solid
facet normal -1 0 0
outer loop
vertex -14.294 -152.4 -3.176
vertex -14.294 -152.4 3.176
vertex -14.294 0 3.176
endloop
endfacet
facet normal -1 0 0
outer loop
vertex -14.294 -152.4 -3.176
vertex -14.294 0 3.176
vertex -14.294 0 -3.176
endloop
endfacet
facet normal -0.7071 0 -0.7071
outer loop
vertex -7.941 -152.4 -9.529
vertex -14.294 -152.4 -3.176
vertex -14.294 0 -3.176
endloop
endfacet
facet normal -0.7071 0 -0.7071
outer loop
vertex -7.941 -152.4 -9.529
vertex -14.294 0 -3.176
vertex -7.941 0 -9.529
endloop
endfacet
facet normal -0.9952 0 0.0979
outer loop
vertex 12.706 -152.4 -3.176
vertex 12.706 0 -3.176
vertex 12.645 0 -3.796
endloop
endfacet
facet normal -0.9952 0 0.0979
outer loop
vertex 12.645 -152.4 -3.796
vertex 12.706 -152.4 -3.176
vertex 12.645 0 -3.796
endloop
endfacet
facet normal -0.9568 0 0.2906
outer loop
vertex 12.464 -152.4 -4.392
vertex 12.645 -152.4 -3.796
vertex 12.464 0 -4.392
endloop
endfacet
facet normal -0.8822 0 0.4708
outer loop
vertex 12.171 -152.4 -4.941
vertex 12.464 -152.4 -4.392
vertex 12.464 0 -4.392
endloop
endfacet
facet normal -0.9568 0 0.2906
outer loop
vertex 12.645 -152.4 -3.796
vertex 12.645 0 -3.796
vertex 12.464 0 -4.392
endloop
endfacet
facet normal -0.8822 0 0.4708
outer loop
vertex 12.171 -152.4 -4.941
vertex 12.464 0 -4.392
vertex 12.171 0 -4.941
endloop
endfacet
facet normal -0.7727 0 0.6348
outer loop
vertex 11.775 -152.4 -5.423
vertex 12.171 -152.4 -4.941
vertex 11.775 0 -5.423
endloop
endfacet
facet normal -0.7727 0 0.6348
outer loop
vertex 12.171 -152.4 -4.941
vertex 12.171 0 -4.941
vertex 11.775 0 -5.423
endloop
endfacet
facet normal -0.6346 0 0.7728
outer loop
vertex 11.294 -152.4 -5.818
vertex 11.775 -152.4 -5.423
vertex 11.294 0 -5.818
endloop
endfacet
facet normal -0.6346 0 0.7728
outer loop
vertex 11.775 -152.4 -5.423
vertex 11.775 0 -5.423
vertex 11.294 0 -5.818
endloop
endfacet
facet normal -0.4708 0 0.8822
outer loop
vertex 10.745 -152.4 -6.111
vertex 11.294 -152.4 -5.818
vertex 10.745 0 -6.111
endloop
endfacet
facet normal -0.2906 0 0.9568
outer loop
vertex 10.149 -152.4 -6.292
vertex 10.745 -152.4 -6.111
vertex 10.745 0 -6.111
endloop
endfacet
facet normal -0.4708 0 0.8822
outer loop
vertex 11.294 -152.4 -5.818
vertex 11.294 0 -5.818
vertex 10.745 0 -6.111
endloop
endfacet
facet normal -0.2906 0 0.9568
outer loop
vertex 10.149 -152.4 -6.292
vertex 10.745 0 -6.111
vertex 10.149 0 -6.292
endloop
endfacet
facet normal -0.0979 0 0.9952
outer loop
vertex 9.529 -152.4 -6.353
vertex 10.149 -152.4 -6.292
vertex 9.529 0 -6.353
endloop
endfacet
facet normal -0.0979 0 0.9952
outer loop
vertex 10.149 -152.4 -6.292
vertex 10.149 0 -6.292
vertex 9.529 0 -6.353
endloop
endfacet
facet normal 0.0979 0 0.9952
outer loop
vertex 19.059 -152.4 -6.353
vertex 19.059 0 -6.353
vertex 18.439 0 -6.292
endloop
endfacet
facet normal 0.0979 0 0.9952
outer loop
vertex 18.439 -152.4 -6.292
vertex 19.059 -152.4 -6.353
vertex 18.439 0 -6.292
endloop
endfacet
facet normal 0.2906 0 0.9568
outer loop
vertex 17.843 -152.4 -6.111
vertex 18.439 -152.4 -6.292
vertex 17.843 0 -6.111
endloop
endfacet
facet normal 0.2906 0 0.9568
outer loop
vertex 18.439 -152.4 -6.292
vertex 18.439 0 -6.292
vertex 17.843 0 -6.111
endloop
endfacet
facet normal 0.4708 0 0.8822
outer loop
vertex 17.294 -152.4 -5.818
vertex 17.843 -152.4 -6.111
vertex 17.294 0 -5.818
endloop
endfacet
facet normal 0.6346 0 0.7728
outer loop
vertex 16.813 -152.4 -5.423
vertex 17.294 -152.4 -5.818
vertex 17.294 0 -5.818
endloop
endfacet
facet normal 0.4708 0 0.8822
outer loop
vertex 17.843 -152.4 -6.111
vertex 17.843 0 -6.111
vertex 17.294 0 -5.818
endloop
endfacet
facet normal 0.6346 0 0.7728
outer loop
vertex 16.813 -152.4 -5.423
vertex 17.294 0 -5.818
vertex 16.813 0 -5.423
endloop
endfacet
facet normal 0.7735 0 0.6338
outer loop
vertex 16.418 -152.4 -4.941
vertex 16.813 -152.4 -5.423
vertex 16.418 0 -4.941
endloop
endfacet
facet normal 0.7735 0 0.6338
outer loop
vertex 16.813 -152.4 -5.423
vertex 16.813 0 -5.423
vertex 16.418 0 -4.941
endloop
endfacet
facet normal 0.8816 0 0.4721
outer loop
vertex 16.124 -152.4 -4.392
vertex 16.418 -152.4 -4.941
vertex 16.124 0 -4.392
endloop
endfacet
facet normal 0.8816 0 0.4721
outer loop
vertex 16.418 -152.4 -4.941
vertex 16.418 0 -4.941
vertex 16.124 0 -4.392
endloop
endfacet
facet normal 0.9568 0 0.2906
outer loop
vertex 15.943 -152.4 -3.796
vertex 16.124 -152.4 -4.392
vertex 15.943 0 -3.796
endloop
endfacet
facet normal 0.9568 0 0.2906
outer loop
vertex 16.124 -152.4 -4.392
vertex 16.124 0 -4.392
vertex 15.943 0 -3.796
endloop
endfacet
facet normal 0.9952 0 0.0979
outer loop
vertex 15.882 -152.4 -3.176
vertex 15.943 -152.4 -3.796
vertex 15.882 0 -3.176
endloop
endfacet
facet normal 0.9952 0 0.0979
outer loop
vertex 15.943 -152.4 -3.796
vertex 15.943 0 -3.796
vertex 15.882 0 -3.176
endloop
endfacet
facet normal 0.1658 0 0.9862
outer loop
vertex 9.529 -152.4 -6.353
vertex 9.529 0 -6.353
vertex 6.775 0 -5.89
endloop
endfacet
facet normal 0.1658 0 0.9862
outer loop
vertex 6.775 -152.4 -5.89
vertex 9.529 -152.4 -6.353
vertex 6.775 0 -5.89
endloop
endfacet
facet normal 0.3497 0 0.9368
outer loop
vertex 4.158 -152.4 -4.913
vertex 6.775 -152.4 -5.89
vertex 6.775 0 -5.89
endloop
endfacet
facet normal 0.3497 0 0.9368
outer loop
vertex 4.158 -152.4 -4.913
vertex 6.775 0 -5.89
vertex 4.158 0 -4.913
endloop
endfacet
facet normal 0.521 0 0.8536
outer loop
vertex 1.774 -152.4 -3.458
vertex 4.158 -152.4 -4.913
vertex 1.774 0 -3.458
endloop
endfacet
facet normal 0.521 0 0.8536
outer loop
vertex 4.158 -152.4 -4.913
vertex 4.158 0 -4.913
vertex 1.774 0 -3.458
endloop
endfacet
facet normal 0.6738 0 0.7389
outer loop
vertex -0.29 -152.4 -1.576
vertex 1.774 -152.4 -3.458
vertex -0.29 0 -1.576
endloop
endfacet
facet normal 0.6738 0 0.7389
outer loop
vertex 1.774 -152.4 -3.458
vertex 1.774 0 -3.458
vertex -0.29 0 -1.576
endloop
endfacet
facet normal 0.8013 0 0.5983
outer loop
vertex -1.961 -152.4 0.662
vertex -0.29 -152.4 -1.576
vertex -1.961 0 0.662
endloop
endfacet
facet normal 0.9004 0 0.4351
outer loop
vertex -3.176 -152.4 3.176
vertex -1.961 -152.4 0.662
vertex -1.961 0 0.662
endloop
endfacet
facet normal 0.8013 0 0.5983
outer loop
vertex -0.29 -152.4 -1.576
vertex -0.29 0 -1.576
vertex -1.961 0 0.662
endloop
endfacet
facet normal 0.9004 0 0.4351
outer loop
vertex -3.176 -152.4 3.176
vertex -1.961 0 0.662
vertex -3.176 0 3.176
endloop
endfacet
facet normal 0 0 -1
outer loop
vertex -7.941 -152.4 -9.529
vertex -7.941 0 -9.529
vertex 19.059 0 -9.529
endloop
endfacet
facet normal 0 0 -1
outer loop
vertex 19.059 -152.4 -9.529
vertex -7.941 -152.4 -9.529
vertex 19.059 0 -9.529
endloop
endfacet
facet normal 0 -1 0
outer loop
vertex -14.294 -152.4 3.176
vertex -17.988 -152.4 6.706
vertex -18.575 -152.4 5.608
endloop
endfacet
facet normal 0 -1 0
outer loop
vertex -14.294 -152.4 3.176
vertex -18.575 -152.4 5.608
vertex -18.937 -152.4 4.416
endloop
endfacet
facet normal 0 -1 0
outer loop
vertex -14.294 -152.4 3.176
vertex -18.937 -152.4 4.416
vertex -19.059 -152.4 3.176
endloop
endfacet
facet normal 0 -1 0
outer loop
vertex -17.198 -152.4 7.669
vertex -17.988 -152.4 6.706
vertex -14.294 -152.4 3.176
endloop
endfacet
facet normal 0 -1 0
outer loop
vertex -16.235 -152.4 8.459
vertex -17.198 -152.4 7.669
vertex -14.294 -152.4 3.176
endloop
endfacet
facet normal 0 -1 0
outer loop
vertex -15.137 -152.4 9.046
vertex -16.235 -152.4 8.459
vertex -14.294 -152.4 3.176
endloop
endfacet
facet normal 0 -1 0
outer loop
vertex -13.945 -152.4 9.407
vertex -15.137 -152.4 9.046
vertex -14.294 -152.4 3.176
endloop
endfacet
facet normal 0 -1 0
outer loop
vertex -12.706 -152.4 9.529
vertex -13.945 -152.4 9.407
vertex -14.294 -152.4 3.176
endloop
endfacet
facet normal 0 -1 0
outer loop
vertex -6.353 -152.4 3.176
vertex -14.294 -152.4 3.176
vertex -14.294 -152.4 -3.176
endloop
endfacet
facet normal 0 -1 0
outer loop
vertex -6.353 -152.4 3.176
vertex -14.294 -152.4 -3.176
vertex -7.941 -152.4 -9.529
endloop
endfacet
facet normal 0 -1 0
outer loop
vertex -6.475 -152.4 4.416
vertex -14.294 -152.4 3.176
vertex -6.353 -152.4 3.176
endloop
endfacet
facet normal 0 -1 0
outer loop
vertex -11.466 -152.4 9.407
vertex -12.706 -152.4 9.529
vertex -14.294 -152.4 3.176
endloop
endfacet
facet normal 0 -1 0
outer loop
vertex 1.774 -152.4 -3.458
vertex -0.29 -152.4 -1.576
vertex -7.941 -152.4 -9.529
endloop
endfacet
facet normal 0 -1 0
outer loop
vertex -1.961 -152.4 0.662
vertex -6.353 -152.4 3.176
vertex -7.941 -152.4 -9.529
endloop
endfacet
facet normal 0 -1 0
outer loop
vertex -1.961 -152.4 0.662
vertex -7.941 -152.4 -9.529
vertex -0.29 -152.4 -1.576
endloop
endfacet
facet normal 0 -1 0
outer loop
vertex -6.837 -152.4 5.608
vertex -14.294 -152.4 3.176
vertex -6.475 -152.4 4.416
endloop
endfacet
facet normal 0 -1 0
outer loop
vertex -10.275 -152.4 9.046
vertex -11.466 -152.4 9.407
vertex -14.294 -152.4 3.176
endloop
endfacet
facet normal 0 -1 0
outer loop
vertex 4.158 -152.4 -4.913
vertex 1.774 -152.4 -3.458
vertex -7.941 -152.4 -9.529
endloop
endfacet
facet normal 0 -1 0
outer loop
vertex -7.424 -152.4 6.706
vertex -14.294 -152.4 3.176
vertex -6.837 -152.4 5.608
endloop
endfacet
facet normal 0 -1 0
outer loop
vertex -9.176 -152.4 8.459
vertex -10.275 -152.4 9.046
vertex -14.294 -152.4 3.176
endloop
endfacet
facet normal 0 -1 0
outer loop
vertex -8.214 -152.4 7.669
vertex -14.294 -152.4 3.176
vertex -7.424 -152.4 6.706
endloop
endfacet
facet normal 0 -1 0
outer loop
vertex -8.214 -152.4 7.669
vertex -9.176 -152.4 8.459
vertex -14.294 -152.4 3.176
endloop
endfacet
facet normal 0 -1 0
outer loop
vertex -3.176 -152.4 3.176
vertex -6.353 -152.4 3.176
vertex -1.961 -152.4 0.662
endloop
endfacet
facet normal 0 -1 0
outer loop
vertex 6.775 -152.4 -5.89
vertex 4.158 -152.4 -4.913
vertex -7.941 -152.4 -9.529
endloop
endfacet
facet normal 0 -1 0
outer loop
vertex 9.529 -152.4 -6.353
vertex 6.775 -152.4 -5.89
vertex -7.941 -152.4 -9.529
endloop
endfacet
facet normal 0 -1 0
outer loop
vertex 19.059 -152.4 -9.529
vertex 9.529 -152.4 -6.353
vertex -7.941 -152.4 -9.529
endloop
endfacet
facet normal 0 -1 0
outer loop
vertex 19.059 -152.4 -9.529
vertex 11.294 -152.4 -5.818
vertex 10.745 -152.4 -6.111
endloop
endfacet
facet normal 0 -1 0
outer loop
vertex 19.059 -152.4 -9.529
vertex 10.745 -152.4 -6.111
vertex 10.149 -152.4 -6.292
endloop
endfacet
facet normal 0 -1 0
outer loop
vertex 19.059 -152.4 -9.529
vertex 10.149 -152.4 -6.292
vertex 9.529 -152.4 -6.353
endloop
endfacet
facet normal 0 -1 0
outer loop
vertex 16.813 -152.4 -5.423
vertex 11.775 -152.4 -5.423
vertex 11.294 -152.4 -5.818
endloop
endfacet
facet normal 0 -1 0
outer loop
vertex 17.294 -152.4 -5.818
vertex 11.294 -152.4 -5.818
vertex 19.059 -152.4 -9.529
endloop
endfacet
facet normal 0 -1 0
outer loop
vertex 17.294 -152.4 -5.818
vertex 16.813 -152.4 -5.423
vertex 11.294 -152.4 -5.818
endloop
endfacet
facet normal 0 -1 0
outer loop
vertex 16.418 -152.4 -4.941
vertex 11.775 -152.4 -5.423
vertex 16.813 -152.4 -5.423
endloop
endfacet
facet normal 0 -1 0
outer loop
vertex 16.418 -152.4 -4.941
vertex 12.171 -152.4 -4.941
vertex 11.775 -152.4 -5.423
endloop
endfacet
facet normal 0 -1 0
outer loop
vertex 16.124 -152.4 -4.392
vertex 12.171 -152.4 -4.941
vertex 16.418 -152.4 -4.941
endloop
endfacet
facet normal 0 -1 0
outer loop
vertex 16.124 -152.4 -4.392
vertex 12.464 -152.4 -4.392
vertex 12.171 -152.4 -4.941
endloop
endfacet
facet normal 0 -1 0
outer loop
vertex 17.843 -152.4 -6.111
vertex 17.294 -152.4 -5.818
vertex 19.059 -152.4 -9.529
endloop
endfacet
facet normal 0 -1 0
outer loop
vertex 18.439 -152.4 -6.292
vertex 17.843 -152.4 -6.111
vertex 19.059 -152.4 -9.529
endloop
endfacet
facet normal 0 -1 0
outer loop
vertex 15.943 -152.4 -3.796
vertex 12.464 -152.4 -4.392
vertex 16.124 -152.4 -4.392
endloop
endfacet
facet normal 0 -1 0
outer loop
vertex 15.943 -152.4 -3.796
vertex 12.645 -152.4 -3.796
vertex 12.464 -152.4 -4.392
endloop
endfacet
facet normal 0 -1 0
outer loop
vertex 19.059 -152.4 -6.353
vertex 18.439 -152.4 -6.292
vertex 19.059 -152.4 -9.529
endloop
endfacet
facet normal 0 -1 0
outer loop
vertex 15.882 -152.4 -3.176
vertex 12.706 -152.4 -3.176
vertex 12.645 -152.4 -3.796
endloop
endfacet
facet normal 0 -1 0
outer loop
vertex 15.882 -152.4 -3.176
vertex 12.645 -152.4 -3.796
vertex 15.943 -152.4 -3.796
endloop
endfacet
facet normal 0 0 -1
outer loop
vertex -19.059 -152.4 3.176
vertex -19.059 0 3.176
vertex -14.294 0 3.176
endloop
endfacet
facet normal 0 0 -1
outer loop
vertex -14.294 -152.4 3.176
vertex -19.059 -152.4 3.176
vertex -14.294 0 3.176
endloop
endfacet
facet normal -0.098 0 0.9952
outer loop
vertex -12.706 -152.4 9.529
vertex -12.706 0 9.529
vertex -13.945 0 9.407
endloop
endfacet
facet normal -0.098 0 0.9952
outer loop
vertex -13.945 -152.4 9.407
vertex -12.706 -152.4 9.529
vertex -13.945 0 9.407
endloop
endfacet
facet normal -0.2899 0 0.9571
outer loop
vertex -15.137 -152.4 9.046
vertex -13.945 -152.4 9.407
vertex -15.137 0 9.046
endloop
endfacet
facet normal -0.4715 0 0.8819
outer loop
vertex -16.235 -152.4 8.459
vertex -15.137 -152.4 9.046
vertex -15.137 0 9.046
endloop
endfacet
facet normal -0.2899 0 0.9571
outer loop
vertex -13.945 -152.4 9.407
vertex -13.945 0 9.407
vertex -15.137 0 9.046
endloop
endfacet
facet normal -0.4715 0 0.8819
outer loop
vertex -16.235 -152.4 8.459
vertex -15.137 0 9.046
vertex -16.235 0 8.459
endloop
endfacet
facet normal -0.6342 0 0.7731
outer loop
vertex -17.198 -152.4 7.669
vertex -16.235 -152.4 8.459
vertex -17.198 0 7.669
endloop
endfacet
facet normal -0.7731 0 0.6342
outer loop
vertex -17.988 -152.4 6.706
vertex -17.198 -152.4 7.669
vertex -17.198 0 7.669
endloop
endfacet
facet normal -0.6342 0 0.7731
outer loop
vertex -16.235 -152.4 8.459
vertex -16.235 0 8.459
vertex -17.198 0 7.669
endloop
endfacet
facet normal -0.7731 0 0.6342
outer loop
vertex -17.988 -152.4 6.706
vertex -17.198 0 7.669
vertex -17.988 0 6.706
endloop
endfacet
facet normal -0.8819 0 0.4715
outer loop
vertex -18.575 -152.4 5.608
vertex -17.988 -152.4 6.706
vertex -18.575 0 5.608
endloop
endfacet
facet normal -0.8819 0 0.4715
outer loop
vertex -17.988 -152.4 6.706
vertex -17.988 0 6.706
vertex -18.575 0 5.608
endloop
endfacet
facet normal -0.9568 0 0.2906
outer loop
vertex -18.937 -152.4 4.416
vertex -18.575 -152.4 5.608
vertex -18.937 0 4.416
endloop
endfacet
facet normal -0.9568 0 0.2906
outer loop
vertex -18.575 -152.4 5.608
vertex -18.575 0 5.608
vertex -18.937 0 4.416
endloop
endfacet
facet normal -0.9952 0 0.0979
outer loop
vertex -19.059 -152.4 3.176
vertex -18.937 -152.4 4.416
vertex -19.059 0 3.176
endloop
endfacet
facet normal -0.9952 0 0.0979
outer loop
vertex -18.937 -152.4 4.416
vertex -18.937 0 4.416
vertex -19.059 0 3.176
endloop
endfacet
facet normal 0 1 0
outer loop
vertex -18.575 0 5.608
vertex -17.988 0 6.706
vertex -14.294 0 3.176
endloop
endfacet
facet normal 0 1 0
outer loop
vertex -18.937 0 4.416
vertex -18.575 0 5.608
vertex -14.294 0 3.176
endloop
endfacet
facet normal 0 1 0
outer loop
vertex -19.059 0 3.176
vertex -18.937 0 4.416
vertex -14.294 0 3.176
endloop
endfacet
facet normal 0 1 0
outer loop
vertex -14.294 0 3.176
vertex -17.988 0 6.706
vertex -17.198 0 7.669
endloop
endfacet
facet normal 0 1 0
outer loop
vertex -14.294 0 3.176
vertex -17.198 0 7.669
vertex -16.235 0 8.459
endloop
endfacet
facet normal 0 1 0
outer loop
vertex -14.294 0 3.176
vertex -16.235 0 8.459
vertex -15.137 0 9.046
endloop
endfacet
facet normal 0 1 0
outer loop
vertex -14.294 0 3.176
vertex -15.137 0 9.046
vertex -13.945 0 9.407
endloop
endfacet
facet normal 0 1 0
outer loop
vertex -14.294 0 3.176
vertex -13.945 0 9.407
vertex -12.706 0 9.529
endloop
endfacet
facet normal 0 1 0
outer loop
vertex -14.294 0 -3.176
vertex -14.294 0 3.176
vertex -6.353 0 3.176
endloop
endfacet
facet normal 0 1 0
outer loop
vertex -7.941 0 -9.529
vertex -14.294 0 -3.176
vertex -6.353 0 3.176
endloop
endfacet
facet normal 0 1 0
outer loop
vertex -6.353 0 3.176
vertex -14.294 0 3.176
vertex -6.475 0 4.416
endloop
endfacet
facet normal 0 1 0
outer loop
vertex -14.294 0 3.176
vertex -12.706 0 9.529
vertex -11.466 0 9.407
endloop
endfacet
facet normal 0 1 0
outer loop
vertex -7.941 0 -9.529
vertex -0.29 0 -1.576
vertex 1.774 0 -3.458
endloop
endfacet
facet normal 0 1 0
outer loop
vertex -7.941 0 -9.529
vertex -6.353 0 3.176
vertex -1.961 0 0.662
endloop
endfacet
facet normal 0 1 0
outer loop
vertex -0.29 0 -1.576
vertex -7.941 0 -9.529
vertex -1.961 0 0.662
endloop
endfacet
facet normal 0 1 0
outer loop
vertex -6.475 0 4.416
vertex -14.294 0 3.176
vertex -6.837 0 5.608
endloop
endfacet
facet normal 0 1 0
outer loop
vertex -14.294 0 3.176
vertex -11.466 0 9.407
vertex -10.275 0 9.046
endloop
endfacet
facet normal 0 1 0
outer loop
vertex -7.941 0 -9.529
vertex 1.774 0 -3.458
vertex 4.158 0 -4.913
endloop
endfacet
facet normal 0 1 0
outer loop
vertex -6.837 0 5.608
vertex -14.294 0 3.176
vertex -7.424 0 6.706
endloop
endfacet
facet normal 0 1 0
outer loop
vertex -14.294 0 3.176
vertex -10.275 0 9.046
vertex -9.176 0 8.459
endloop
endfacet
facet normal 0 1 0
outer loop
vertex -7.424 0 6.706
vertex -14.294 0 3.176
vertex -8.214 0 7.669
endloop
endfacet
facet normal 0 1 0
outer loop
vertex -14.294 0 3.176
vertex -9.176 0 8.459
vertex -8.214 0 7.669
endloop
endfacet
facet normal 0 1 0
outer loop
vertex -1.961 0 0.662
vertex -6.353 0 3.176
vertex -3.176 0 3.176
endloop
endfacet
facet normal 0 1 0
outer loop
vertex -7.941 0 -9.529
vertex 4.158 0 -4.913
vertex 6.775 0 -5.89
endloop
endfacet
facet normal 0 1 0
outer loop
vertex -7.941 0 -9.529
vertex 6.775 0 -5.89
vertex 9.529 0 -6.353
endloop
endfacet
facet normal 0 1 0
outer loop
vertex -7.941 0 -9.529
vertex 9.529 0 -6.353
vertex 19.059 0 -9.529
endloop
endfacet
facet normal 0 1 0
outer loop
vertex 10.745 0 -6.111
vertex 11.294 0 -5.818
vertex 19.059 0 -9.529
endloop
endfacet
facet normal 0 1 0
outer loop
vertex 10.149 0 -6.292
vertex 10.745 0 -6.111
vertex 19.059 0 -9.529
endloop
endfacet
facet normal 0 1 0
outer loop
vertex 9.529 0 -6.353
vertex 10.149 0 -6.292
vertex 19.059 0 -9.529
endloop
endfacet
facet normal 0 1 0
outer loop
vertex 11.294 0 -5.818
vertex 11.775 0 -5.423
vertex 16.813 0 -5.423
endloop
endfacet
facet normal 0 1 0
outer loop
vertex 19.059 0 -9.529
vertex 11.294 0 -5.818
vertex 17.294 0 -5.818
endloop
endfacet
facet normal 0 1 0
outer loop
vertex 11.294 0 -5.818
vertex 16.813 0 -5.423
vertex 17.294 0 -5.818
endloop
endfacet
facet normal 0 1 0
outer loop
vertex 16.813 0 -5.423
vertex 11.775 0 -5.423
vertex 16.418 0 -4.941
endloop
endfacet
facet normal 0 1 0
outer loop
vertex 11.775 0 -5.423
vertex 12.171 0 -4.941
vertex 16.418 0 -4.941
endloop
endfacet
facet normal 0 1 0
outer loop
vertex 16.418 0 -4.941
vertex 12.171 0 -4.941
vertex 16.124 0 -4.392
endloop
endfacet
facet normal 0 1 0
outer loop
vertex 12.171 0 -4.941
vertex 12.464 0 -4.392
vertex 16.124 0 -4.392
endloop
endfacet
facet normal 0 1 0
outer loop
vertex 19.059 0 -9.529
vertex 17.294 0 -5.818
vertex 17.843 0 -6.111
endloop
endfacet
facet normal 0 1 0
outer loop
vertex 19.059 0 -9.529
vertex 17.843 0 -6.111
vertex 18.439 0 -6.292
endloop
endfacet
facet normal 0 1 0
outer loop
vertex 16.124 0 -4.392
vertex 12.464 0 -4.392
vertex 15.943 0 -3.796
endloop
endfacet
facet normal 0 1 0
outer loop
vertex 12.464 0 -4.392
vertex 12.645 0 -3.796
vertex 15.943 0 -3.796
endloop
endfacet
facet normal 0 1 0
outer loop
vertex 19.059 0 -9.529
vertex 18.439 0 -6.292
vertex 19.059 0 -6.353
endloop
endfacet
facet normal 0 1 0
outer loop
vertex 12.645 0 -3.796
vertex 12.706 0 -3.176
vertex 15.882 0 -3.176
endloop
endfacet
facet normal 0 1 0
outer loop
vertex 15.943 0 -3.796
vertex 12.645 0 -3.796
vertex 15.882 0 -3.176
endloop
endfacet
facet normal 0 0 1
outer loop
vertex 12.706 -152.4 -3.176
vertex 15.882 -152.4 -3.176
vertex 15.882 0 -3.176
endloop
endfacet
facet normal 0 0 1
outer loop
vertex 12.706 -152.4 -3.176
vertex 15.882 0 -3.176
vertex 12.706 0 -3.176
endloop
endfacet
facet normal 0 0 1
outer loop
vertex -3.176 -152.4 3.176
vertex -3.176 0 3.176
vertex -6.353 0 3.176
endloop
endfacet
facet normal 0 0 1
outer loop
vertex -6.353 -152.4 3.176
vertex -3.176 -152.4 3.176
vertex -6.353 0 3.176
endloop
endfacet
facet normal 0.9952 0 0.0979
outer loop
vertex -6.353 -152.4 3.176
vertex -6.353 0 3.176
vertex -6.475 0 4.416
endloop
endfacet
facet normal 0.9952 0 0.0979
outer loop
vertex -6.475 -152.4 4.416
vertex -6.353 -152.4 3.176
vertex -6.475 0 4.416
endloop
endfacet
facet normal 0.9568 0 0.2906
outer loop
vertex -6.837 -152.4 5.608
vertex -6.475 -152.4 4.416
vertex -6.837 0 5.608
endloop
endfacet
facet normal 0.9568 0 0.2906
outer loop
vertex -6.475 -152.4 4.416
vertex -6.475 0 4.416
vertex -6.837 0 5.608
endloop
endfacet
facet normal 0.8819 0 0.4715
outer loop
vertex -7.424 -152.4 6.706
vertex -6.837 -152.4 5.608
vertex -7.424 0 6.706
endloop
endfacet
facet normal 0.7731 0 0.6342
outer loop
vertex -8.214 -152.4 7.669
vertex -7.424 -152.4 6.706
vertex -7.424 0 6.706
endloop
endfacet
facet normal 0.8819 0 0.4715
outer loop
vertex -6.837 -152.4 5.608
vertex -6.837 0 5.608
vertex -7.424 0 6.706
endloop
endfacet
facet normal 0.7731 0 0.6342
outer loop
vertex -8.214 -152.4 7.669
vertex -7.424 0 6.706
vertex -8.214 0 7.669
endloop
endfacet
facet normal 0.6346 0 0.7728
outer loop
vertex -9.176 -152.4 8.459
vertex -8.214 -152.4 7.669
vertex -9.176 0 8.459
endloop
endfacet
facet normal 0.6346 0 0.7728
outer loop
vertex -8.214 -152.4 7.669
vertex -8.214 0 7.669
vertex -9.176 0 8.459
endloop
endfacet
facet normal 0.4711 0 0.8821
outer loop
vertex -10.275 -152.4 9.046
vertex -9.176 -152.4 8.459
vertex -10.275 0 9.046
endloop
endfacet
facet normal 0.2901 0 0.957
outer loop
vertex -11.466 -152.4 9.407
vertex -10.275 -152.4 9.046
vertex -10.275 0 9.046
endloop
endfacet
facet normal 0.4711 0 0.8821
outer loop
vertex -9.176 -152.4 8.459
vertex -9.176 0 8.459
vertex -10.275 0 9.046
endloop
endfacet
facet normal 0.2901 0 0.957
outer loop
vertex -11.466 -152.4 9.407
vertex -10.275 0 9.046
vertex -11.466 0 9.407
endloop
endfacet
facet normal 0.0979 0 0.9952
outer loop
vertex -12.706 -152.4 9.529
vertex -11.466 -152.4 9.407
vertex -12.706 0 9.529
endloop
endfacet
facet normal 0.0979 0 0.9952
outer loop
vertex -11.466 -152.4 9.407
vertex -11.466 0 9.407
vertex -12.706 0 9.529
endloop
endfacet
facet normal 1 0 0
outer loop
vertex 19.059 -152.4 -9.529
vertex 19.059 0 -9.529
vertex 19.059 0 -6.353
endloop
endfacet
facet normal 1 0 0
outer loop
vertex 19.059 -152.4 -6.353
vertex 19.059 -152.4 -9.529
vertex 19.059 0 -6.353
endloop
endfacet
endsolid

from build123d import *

# Parameters (mm, degrees)
F1_DEPTH = 152.4


# Not quite as in the source:
# - ends of sketch curves that miss each other by under 0.0002 mm in the source are joined


with BuildPart() as f1:
    # F0 (on Front) → F1 (new body)
    with BuildSketch(Plane.XZ):
        with BuildLine():
            ThreePointArc((-6.352921, 3.1764732), (-8.2136484806, 7.6686667194), (-12.705842, 9.5293942))
            ThreePointArc((-12.705842, 9.5293942), (-17.1980355194, 7.6686667194), (-19.058763, 3.1764732))
            Line((-19.058763, 3.1764732), (-14.2940786, 3.1764732))
            Line((-14.2940786, 3.1764732), (-14.2940786, -3.1764478))
            Line((-14.2940786, -3.1764478), (-7.9411576, -9.5293942))
            Line((-7.9411576, -9.5293942), (19.058763, -9.5293942))
            Line((19.058763, -9.5293942), (19.058763, -6.352921))
            ThreePointArc((19.058763, -6.352921), (16.81265726, -5.42255354), (15.8822898, -3.1764478))
            Line((15.8822898, -3.1764478), (12.705842, -3.1764478))
            ThreePointArc((12.705842, -3.1764478), (11.77549994, -5.42255354), (9.5293942, -6.352921))
            ThreePointArc((9.5293942, -6.352921), (1.7744943071, -3.4575238304), (-3.1764521069, 3.1764716036))
            Line((-3.1764521069, 3.1764716036), (-6.352921, 3.1764732))
        make_face()
    extrude(amount=F1_DEPTH)


solid = f1.part
